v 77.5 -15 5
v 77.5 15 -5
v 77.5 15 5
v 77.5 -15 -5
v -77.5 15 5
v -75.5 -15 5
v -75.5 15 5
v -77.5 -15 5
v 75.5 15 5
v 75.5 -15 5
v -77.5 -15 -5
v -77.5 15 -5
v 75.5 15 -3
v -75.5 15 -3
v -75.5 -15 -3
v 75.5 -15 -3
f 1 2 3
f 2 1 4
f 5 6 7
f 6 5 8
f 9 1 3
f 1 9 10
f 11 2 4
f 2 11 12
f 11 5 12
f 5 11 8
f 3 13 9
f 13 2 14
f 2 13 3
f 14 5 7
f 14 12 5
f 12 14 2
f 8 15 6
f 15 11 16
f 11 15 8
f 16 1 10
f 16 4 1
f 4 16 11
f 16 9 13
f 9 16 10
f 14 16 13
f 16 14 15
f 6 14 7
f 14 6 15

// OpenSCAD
width=155;
depth=30;
height=10;
border_size=2;


difference() {
    cube([width, depth, height], center=true);
    translate([0,0,border_size])
    cube([width-(border_size*2), depth+1, height], center=true);
}
